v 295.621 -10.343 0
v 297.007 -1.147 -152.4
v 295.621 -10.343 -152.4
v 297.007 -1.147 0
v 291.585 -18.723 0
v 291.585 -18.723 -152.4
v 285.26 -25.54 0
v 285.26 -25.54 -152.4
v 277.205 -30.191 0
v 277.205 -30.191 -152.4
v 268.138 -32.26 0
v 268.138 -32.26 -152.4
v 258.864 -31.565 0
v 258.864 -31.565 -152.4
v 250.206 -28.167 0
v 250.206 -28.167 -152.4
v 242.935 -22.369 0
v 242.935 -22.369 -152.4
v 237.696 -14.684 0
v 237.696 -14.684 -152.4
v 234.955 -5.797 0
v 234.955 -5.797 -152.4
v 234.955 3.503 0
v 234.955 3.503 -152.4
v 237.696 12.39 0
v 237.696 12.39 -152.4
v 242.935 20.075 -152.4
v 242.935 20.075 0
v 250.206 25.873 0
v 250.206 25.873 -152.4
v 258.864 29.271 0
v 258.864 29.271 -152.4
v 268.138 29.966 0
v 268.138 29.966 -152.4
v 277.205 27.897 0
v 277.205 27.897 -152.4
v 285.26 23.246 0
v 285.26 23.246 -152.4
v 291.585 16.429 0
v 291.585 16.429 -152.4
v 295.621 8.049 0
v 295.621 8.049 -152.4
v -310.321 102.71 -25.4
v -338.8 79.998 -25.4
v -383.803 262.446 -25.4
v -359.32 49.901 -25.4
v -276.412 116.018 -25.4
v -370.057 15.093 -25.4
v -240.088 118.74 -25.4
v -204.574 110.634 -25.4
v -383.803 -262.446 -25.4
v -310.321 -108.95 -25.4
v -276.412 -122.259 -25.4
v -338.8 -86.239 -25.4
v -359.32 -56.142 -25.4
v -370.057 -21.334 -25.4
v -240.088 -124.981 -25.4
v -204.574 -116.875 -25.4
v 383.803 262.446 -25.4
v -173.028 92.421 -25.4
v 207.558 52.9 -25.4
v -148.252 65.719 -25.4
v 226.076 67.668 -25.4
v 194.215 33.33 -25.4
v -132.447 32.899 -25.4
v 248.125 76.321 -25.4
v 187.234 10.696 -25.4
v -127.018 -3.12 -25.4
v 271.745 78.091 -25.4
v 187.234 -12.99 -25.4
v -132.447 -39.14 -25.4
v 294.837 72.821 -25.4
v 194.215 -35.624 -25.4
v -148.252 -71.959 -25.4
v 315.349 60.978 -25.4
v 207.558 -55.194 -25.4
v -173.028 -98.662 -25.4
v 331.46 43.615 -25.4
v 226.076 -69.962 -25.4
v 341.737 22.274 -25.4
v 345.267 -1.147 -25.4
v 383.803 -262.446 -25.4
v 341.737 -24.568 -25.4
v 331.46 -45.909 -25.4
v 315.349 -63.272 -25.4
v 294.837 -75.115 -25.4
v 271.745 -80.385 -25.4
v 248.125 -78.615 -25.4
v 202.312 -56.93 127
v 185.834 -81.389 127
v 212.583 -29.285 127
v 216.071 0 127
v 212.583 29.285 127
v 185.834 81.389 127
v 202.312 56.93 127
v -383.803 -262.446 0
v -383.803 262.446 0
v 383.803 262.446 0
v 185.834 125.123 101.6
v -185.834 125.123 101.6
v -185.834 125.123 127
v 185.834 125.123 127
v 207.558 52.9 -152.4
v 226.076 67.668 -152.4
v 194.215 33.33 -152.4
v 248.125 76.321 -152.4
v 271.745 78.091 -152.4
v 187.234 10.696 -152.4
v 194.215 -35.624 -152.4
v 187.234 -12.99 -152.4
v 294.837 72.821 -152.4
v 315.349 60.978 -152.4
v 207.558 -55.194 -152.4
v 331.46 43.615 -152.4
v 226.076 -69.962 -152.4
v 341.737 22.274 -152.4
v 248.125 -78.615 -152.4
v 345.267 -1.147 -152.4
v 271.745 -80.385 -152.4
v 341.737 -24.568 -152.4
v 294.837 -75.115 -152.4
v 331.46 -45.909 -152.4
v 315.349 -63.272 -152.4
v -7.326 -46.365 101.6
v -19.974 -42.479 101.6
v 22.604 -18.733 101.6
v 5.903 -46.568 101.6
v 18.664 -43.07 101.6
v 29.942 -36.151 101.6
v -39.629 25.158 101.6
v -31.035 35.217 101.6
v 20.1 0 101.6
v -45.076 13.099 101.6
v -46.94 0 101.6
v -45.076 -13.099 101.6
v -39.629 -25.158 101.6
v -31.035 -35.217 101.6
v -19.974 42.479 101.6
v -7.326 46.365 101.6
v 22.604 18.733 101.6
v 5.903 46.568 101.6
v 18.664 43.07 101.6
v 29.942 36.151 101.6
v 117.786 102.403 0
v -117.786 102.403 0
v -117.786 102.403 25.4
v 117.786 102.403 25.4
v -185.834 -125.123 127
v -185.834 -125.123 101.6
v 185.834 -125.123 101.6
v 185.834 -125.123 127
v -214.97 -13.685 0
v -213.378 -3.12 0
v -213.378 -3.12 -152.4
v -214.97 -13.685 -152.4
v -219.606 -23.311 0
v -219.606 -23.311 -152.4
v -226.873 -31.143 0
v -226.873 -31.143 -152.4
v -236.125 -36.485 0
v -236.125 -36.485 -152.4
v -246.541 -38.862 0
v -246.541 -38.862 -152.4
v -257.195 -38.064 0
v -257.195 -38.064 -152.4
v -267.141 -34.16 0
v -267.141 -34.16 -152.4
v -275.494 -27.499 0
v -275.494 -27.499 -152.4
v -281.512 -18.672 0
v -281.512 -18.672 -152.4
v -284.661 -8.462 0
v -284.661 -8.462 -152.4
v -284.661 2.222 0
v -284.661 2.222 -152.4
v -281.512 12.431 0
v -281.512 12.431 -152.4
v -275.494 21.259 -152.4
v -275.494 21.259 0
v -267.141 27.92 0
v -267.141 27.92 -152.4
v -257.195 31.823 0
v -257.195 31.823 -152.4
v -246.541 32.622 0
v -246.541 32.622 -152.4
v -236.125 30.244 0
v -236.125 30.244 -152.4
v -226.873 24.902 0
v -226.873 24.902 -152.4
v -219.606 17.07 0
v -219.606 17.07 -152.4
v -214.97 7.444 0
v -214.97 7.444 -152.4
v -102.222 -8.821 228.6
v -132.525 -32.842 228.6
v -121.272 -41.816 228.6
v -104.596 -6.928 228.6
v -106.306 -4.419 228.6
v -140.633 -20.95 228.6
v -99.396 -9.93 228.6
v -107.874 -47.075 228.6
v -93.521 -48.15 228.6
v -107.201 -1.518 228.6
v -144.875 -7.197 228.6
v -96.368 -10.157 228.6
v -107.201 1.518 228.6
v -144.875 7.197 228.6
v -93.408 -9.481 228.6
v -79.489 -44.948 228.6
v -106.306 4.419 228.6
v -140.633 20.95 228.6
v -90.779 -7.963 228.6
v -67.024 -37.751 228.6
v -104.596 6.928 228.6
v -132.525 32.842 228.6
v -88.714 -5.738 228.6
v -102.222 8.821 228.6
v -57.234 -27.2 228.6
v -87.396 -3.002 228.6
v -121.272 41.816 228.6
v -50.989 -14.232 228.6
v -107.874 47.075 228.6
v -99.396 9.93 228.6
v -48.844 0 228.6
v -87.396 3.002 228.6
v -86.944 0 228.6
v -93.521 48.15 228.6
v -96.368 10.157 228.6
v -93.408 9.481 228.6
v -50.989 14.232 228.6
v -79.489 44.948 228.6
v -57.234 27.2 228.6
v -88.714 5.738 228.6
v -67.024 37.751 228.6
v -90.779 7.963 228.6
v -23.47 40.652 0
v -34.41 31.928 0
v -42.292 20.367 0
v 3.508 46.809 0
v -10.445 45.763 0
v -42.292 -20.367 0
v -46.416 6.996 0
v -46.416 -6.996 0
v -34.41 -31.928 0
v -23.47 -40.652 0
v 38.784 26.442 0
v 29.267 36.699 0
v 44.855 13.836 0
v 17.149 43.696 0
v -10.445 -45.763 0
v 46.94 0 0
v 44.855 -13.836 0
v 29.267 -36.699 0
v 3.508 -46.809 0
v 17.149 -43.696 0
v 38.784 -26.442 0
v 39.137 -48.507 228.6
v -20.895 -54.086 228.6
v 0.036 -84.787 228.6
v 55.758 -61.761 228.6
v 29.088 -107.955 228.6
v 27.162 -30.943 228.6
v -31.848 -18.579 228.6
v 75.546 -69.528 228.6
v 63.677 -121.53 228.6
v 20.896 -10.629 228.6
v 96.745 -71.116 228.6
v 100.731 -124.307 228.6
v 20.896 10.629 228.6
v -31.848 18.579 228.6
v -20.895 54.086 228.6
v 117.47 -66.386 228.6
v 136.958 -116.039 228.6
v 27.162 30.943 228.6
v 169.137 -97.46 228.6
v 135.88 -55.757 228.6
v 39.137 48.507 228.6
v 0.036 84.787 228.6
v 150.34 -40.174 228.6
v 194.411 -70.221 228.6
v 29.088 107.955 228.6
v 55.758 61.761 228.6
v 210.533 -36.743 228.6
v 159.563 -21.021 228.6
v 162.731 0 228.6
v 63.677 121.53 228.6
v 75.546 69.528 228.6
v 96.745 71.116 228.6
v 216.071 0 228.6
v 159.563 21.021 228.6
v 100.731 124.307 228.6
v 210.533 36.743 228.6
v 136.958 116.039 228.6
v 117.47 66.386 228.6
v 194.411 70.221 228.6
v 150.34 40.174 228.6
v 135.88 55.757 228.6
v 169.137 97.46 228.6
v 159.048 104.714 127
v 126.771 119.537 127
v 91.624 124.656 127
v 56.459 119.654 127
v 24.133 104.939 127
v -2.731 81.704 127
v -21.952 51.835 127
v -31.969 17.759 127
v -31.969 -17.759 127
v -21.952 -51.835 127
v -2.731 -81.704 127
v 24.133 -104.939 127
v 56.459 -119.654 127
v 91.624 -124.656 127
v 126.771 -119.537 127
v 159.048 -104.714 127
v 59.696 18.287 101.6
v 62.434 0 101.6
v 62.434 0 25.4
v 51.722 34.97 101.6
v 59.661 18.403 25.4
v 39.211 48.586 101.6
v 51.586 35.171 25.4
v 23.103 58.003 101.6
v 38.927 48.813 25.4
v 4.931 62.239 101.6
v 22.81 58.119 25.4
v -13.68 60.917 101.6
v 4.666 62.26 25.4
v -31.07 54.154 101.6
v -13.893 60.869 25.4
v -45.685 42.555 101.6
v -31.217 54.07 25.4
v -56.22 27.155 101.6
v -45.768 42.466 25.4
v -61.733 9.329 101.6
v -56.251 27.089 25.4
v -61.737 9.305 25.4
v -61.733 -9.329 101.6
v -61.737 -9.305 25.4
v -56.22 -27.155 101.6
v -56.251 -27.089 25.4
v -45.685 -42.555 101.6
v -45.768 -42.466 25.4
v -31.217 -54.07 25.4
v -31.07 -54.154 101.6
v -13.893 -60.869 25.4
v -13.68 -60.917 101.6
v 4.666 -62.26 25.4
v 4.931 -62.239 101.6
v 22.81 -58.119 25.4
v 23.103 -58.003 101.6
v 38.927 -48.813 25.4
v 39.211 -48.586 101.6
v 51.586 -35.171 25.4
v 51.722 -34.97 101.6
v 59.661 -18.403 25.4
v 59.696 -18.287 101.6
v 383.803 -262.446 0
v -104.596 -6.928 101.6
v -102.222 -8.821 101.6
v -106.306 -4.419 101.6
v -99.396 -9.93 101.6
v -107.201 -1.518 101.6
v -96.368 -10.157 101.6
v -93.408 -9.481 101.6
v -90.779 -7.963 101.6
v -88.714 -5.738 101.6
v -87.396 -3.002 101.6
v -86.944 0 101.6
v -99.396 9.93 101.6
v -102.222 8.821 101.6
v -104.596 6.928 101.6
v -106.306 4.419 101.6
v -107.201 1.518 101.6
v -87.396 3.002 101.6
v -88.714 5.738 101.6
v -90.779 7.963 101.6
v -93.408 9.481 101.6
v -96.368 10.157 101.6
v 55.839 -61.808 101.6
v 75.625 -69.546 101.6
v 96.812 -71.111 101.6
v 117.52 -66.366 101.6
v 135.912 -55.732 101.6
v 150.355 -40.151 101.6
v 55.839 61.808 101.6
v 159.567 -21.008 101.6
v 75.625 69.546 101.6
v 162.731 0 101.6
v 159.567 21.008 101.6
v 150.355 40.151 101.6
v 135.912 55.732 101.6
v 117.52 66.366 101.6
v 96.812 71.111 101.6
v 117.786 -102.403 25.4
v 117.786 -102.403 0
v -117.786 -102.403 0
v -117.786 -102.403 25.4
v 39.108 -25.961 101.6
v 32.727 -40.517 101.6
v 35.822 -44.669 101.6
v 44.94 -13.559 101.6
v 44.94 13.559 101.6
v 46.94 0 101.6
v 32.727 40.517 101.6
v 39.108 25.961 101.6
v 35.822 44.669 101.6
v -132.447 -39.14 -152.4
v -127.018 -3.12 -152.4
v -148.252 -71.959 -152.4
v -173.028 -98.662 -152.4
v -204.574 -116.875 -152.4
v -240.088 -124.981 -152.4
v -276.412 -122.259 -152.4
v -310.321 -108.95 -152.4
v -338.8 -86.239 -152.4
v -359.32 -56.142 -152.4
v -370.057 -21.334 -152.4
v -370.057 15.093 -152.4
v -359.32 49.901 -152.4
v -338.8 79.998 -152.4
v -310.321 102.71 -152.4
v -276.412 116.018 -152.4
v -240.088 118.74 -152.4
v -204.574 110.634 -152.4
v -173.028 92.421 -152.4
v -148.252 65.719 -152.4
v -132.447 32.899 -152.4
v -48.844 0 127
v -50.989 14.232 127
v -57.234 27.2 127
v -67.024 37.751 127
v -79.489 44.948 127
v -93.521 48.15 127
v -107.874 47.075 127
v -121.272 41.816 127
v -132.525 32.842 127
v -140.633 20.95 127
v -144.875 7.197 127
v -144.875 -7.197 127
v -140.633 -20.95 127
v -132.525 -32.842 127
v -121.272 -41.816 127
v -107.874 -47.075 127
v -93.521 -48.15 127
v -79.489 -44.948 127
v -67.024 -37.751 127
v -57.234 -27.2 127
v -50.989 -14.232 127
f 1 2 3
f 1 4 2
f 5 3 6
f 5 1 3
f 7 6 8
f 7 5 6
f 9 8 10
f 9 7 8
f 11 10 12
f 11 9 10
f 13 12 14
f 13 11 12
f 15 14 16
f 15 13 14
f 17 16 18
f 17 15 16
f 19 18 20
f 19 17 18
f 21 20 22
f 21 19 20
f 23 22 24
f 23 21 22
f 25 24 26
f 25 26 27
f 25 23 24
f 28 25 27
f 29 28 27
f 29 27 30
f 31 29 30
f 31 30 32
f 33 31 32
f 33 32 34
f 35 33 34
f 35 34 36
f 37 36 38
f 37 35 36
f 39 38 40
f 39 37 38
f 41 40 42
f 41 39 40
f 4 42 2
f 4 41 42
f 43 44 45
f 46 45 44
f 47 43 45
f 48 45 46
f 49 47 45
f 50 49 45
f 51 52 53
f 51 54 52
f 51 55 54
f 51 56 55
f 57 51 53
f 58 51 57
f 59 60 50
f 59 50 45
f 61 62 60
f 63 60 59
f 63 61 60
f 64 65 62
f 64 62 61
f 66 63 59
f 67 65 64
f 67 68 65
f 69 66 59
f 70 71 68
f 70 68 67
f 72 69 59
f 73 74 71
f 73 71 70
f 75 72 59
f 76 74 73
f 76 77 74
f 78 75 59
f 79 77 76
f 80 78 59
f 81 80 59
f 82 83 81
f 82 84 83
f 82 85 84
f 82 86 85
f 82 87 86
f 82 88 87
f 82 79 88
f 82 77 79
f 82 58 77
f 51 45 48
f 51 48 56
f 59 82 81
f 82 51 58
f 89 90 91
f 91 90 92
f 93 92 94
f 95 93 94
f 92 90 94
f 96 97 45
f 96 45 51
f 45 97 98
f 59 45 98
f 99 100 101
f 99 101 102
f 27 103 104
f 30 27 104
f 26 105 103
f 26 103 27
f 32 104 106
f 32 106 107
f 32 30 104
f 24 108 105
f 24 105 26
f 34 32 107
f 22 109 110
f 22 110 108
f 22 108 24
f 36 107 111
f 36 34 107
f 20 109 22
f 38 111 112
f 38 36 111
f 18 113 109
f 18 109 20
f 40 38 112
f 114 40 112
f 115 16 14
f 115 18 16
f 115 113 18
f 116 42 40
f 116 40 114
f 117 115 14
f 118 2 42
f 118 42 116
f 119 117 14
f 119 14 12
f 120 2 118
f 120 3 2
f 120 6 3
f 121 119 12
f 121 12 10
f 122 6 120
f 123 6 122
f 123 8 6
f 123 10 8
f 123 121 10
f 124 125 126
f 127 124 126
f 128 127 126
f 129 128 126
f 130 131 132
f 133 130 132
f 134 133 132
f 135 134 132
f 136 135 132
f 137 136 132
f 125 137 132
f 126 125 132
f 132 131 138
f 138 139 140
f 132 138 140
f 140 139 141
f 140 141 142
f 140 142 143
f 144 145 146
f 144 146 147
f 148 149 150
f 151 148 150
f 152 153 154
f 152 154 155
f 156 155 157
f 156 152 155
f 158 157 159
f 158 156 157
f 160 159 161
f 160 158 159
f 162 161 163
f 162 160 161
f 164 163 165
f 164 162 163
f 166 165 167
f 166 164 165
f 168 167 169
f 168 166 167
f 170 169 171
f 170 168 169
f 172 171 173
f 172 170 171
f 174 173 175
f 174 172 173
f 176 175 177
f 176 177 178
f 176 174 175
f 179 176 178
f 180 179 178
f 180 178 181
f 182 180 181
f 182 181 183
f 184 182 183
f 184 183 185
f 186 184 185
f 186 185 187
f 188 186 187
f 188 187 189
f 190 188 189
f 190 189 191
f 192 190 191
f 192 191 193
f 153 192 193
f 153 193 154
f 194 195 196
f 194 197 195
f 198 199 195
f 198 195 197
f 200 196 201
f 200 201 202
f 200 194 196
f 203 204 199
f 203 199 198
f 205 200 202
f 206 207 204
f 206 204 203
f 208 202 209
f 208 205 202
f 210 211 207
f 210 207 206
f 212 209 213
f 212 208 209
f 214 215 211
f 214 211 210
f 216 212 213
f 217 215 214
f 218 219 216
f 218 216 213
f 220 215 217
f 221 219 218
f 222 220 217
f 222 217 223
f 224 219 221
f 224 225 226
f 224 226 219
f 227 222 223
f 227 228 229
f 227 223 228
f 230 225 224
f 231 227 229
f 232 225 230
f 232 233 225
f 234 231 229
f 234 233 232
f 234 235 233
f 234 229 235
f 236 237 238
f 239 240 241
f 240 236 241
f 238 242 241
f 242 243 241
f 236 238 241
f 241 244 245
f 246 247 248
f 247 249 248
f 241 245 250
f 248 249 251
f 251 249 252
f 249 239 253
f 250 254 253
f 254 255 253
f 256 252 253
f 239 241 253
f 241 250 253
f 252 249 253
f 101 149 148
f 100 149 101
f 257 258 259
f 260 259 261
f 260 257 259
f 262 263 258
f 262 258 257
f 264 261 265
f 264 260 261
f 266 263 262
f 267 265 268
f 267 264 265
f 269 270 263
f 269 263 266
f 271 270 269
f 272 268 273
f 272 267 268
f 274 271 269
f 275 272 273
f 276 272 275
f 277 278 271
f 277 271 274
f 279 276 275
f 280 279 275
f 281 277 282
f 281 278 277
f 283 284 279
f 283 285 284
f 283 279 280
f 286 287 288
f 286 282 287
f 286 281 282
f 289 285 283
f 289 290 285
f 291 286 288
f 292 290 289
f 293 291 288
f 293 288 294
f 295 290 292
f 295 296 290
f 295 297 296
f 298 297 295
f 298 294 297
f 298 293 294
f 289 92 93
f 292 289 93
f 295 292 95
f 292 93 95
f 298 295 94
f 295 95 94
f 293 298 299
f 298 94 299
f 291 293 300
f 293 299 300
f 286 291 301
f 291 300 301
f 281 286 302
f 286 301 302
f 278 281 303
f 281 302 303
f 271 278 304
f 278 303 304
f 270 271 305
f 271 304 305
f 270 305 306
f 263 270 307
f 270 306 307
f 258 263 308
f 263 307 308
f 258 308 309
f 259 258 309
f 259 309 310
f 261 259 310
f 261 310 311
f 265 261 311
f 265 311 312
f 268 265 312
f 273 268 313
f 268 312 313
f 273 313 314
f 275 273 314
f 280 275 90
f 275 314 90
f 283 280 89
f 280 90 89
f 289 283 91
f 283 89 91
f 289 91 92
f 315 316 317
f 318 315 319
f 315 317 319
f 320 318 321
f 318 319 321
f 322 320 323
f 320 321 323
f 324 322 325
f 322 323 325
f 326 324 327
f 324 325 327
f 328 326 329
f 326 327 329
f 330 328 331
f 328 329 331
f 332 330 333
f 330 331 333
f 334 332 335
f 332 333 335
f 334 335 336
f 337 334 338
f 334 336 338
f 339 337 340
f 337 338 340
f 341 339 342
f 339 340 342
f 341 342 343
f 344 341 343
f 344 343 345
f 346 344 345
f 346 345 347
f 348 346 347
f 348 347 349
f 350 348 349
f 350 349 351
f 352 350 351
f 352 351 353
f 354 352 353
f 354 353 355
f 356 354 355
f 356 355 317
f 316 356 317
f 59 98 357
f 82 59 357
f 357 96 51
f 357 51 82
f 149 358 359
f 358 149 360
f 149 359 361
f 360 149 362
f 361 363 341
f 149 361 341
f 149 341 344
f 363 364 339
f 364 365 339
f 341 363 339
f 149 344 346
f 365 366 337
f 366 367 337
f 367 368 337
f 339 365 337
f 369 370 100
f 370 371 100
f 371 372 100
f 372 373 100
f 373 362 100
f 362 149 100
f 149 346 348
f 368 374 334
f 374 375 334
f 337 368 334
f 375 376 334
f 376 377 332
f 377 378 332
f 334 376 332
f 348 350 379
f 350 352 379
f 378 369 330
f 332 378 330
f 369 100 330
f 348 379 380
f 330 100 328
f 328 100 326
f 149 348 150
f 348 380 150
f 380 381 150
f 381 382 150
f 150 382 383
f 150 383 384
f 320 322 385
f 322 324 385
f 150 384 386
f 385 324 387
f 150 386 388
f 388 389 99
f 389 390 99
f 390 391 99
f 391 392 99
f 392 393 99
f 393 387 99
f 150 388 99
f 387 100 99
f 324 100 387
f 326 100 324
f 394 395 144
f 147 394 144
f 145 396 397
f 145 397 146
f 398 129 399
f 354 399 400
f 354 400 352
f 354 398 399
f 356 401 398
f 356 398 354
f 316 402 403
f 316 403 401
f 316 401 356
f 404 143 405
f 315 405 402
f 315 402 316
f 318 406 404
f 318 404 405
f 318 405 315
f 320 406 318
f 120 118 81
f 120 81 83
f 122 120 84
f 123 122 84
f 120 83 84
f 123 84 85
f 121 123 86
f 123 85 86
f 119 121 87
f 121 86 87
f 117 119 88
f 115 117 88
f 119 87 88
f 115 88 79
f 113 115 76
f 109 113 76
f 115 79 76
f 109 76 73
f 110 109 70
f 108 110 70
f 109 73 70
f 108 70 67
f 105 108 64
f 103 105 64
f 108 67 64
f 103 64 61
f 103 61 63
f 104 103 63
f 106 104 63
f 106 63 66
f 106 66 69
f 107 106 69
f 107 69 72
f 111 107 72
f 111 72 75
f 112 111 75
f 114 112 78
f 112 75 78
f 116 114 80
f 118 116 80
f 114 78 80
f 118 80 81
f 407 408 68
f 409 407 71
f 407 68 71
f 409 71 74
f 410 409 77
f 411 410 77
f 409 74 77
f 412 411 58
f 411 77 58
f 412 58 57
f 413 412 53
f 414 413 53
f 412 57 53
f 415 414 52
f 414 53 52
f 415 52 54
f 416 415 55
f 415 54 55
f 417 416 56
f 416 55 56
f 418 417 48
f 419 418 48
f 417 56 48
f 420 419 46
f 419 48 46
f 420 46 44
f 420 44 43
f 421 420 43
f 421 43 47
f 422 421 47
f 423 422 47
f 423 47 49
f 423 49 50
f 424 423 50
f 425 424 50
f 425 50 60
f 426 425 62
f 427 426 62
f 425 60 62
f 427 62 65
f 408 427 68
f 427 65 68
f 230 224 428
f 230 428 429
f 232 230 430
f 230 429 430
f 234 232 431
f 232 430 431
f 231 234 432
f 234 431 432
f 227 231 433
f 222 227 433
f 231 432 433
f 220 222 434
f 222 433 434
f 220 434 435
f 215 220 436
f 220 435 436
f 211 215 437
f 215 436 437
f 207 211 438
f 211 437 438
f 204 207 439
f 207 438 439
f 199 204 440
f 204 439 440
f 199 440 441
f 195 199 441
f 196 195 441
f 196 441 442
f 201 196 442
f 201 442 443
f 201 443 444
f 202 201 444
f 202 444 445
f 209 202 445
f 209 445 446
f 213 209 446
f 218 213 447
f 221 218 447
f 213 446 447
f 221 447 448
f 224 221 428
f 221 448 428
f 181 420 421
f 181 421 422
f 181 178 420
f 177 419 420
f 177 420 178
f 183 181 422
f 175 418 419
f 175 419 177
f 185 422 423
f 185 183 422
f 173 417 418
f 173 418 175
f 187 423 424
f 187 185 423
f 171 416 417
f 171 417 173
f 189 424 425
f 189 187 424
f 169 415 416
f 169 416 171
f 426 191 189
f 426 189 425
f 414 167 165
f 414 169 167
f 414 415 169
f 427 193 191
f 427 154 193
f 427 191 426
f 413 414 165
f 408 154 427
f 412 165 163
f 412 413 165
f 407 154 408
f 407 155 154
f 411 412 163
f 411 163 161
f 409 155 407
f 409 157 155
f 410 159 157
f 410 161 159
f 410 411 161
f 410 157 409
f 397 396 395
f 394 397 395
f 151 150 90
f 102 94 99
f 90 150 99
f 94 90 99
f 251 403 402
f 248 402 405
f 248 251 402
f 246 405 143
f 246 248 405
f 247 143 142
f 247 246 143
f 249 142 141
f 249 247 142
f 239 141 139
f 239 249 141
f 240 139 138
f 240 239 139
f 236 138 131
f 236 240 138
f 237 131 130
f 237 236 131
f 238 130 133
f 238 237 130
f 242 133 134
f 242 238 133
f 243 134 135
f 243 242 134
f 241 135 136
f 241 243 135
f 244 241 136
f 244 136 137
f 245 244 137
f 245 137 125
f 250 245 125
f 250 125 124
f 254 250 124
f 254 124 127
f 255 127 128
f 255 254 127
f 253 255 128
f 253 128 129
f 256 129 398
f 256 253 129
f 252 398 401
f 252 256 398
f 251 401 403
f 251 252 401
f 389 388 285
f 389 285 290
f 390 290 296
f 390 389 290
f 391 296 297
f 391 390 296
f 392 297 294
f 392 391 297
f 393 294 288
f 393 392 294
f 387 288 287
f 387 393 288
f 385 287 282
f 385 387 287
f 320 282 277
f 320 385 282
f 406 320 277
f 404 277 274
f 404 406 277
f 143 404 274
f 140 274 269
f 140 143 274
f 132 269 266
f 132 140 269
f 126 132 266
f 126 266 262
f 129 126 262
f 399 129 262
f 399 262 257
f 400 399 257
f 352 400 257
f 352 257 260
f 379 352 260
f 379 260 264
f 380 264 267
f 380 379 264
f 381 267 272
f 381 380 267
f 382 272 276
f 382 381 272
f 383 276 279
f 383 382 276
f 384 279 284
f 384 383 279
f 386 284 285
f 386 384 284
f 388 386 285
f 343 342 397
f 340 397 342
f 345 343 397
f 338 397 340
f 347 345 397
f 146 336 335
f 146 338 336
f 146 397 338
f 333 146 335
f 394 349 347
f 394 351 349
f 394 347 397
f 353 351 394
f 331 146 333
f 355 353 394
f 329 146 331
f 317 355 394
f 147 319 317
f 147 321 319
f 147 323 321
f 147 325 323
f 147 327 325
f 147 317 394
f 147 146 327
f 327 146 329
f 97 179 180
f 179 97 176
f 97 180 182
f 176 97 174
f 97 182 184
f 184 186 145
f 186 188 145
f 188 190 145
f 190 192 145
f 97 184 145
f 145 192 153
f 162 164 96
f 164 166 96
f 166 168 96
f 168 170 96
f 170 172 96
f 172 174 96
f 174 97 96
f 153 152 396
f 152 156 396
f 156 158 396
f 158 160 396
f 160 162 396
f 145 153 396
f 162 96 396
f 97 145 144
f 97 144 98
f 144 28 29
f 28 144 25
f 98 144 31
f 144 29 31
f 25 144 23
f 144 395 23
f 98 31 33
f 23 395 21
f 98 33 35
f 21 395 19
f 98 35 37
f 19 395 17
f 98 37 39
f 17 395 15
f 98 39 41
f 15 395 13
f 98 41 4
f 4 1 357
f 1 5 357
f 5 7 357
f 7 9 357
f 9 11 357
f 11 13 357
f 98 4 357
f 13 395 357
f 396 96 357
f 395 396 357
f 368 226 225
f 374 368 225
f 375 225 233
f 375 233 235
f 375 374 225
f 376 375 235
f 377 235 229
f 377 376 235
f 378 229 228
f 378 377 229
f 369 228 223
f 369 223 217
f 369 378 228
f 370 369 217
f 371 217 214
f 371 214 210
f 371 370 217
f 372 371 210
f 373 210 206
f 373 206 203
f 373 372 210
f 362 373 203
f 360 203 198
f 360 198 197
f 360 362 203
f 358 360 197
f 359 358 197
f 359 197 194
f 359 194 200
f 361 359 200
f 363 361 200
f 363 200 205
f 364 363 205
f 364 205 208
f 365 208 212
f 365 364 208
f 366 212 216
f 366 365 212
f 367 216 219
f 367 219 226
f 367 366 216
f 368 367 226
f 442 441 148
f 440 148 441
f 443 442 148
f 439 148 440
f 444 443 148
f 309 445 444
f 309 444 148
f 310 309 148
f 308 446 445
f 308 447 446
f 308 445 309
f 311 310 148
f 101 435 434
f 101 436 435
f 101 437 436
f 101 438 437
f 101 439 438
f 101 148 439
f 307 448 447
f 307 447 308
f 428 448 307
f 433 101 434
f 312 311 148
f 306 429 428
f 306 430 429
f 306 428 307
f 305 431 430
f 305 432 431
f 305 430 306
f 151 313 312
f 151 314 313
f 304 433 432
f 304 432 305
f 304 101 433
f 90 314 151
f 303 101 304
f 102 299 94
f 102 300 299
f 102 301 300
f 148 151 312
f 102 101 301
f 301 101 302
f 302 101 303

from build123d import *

# Parameters (mm, degrees)
F0_W      = 235.571132
F0_H      = 204.806238
F0_R      = 46.940365
F1_DEPTH  = 25.4
F2_R      = 62.434365
F2_R_2    = 46.940365
F3_DEPTH  = 76.2
F4_W      = 371.668696
F4_H      = 250.246078
F4_R      = 10.18532
F4_R_2    = 71.315822
F5_DEPTH  = 25.4
F6_R      = 48.285319
F6_R_2    = 10.18532
F6_R_3    = 124.655822
F6_R_4    = 71.315822
F7_DEPTH  = 101.6
F8_W      = 767.606258
F8_H      = 524.892748
F8_R      = 35.842084
F8_R_2    = 31.200306
F9_DEPTH  = 25.4
F10_R     = 79.460308
F10_R_2   = 31.200306
F10_R_3   = 122.202093
F10_R_4   = 35.842084
F11_DEPTH = 127


with BuildPart() as f1:
    # F0 (on Top) → F1 (new body)
    with BuildSketch(Plane.XY):
        Rectangle(F0_W, F0_H)
        Circle(F0_R, mode=Mode.SUBTRACT)
    extrude(amount=F1_DEPTH)

    # F2 (on face) → F3 (join)
    with BuildSketch(Plane.XY.offset(25.4)):
        Circle(F2_R)
        Circle(F2_R_2, mode=Mode.SUBTRACT)
    extrude(amount=F3_DEPTH)

    # F4 (on face) → F5 (join)
    with BuildSketch(Plane.XY.offset(101.6)):
        Rectangle(F4_W, F4_H)
        with Locations((-97.129136, 0)):
            Circle(F4_R, mode=Mode.SUBTRACT)
        with Locations((91.415659, 0)):
            Circle(F4_R_2, mode=Mode.SUBTRACT)
    extrude(amount=F5_DEPTH)

    # F6 (on face) → F7 (join)
    with BuildSketch(Plane.XY.offset(127)):
        with Locations((-97.129136, 0)):
            Circle(F6_R)
        with Locations((-97.129136, 0)):
            Circle(F6_R_2, mode=Mode.SUBTRACT)
        with Locations((91.415659, 0)):
            Circle(F6_R_3)
        with Locations((91.415659, 0)):
            Circle(F6_R_4, mode=Mode.SUBTRACT)
    extrude(amount=F7_DEPTH)

    # F8 (on face) → F9 (join)
    with BuildSketch(Plane(origin=(0, 0, 0), x_dir=(1, 0, 0), z_dir=(0, 0, -1))):
        Rectangle(F8_W, F8_H)
        with Locations((-249.21973, 3.120291)):
            Circle(F8_R, mode=Mode.SUBTRACT)
        with Locations((265.806586, 1.147008)):
            Circle(F8_R_2, mode=Mode.SUBTRACT)
    extrude(amount=F9_DEPTH)

    # F10 (on face) → F11 (join)
    with BuildSketch(Plane(origin=(0, 0, -25.4), x_dir=(1, 0, 0), z_dir=(0, 0, -1))):
        with Locations((265.806586, 1.147008)):
            Circle(F10_R)
        with Locations((265.806586, 1.147008)):
            Circle(F10_R_2, mode=Mode.SUBTRACT)
        with Locations((-249.21973, 3.120291)):
            Circle(F10_R_3)
        with Locations((-249.21973, 3.120291)):
            Circle(F10_R_4, mode=Mode.SUBTRACT)
    extrude(amount=F11_DEPTH)


solid = f1.part
